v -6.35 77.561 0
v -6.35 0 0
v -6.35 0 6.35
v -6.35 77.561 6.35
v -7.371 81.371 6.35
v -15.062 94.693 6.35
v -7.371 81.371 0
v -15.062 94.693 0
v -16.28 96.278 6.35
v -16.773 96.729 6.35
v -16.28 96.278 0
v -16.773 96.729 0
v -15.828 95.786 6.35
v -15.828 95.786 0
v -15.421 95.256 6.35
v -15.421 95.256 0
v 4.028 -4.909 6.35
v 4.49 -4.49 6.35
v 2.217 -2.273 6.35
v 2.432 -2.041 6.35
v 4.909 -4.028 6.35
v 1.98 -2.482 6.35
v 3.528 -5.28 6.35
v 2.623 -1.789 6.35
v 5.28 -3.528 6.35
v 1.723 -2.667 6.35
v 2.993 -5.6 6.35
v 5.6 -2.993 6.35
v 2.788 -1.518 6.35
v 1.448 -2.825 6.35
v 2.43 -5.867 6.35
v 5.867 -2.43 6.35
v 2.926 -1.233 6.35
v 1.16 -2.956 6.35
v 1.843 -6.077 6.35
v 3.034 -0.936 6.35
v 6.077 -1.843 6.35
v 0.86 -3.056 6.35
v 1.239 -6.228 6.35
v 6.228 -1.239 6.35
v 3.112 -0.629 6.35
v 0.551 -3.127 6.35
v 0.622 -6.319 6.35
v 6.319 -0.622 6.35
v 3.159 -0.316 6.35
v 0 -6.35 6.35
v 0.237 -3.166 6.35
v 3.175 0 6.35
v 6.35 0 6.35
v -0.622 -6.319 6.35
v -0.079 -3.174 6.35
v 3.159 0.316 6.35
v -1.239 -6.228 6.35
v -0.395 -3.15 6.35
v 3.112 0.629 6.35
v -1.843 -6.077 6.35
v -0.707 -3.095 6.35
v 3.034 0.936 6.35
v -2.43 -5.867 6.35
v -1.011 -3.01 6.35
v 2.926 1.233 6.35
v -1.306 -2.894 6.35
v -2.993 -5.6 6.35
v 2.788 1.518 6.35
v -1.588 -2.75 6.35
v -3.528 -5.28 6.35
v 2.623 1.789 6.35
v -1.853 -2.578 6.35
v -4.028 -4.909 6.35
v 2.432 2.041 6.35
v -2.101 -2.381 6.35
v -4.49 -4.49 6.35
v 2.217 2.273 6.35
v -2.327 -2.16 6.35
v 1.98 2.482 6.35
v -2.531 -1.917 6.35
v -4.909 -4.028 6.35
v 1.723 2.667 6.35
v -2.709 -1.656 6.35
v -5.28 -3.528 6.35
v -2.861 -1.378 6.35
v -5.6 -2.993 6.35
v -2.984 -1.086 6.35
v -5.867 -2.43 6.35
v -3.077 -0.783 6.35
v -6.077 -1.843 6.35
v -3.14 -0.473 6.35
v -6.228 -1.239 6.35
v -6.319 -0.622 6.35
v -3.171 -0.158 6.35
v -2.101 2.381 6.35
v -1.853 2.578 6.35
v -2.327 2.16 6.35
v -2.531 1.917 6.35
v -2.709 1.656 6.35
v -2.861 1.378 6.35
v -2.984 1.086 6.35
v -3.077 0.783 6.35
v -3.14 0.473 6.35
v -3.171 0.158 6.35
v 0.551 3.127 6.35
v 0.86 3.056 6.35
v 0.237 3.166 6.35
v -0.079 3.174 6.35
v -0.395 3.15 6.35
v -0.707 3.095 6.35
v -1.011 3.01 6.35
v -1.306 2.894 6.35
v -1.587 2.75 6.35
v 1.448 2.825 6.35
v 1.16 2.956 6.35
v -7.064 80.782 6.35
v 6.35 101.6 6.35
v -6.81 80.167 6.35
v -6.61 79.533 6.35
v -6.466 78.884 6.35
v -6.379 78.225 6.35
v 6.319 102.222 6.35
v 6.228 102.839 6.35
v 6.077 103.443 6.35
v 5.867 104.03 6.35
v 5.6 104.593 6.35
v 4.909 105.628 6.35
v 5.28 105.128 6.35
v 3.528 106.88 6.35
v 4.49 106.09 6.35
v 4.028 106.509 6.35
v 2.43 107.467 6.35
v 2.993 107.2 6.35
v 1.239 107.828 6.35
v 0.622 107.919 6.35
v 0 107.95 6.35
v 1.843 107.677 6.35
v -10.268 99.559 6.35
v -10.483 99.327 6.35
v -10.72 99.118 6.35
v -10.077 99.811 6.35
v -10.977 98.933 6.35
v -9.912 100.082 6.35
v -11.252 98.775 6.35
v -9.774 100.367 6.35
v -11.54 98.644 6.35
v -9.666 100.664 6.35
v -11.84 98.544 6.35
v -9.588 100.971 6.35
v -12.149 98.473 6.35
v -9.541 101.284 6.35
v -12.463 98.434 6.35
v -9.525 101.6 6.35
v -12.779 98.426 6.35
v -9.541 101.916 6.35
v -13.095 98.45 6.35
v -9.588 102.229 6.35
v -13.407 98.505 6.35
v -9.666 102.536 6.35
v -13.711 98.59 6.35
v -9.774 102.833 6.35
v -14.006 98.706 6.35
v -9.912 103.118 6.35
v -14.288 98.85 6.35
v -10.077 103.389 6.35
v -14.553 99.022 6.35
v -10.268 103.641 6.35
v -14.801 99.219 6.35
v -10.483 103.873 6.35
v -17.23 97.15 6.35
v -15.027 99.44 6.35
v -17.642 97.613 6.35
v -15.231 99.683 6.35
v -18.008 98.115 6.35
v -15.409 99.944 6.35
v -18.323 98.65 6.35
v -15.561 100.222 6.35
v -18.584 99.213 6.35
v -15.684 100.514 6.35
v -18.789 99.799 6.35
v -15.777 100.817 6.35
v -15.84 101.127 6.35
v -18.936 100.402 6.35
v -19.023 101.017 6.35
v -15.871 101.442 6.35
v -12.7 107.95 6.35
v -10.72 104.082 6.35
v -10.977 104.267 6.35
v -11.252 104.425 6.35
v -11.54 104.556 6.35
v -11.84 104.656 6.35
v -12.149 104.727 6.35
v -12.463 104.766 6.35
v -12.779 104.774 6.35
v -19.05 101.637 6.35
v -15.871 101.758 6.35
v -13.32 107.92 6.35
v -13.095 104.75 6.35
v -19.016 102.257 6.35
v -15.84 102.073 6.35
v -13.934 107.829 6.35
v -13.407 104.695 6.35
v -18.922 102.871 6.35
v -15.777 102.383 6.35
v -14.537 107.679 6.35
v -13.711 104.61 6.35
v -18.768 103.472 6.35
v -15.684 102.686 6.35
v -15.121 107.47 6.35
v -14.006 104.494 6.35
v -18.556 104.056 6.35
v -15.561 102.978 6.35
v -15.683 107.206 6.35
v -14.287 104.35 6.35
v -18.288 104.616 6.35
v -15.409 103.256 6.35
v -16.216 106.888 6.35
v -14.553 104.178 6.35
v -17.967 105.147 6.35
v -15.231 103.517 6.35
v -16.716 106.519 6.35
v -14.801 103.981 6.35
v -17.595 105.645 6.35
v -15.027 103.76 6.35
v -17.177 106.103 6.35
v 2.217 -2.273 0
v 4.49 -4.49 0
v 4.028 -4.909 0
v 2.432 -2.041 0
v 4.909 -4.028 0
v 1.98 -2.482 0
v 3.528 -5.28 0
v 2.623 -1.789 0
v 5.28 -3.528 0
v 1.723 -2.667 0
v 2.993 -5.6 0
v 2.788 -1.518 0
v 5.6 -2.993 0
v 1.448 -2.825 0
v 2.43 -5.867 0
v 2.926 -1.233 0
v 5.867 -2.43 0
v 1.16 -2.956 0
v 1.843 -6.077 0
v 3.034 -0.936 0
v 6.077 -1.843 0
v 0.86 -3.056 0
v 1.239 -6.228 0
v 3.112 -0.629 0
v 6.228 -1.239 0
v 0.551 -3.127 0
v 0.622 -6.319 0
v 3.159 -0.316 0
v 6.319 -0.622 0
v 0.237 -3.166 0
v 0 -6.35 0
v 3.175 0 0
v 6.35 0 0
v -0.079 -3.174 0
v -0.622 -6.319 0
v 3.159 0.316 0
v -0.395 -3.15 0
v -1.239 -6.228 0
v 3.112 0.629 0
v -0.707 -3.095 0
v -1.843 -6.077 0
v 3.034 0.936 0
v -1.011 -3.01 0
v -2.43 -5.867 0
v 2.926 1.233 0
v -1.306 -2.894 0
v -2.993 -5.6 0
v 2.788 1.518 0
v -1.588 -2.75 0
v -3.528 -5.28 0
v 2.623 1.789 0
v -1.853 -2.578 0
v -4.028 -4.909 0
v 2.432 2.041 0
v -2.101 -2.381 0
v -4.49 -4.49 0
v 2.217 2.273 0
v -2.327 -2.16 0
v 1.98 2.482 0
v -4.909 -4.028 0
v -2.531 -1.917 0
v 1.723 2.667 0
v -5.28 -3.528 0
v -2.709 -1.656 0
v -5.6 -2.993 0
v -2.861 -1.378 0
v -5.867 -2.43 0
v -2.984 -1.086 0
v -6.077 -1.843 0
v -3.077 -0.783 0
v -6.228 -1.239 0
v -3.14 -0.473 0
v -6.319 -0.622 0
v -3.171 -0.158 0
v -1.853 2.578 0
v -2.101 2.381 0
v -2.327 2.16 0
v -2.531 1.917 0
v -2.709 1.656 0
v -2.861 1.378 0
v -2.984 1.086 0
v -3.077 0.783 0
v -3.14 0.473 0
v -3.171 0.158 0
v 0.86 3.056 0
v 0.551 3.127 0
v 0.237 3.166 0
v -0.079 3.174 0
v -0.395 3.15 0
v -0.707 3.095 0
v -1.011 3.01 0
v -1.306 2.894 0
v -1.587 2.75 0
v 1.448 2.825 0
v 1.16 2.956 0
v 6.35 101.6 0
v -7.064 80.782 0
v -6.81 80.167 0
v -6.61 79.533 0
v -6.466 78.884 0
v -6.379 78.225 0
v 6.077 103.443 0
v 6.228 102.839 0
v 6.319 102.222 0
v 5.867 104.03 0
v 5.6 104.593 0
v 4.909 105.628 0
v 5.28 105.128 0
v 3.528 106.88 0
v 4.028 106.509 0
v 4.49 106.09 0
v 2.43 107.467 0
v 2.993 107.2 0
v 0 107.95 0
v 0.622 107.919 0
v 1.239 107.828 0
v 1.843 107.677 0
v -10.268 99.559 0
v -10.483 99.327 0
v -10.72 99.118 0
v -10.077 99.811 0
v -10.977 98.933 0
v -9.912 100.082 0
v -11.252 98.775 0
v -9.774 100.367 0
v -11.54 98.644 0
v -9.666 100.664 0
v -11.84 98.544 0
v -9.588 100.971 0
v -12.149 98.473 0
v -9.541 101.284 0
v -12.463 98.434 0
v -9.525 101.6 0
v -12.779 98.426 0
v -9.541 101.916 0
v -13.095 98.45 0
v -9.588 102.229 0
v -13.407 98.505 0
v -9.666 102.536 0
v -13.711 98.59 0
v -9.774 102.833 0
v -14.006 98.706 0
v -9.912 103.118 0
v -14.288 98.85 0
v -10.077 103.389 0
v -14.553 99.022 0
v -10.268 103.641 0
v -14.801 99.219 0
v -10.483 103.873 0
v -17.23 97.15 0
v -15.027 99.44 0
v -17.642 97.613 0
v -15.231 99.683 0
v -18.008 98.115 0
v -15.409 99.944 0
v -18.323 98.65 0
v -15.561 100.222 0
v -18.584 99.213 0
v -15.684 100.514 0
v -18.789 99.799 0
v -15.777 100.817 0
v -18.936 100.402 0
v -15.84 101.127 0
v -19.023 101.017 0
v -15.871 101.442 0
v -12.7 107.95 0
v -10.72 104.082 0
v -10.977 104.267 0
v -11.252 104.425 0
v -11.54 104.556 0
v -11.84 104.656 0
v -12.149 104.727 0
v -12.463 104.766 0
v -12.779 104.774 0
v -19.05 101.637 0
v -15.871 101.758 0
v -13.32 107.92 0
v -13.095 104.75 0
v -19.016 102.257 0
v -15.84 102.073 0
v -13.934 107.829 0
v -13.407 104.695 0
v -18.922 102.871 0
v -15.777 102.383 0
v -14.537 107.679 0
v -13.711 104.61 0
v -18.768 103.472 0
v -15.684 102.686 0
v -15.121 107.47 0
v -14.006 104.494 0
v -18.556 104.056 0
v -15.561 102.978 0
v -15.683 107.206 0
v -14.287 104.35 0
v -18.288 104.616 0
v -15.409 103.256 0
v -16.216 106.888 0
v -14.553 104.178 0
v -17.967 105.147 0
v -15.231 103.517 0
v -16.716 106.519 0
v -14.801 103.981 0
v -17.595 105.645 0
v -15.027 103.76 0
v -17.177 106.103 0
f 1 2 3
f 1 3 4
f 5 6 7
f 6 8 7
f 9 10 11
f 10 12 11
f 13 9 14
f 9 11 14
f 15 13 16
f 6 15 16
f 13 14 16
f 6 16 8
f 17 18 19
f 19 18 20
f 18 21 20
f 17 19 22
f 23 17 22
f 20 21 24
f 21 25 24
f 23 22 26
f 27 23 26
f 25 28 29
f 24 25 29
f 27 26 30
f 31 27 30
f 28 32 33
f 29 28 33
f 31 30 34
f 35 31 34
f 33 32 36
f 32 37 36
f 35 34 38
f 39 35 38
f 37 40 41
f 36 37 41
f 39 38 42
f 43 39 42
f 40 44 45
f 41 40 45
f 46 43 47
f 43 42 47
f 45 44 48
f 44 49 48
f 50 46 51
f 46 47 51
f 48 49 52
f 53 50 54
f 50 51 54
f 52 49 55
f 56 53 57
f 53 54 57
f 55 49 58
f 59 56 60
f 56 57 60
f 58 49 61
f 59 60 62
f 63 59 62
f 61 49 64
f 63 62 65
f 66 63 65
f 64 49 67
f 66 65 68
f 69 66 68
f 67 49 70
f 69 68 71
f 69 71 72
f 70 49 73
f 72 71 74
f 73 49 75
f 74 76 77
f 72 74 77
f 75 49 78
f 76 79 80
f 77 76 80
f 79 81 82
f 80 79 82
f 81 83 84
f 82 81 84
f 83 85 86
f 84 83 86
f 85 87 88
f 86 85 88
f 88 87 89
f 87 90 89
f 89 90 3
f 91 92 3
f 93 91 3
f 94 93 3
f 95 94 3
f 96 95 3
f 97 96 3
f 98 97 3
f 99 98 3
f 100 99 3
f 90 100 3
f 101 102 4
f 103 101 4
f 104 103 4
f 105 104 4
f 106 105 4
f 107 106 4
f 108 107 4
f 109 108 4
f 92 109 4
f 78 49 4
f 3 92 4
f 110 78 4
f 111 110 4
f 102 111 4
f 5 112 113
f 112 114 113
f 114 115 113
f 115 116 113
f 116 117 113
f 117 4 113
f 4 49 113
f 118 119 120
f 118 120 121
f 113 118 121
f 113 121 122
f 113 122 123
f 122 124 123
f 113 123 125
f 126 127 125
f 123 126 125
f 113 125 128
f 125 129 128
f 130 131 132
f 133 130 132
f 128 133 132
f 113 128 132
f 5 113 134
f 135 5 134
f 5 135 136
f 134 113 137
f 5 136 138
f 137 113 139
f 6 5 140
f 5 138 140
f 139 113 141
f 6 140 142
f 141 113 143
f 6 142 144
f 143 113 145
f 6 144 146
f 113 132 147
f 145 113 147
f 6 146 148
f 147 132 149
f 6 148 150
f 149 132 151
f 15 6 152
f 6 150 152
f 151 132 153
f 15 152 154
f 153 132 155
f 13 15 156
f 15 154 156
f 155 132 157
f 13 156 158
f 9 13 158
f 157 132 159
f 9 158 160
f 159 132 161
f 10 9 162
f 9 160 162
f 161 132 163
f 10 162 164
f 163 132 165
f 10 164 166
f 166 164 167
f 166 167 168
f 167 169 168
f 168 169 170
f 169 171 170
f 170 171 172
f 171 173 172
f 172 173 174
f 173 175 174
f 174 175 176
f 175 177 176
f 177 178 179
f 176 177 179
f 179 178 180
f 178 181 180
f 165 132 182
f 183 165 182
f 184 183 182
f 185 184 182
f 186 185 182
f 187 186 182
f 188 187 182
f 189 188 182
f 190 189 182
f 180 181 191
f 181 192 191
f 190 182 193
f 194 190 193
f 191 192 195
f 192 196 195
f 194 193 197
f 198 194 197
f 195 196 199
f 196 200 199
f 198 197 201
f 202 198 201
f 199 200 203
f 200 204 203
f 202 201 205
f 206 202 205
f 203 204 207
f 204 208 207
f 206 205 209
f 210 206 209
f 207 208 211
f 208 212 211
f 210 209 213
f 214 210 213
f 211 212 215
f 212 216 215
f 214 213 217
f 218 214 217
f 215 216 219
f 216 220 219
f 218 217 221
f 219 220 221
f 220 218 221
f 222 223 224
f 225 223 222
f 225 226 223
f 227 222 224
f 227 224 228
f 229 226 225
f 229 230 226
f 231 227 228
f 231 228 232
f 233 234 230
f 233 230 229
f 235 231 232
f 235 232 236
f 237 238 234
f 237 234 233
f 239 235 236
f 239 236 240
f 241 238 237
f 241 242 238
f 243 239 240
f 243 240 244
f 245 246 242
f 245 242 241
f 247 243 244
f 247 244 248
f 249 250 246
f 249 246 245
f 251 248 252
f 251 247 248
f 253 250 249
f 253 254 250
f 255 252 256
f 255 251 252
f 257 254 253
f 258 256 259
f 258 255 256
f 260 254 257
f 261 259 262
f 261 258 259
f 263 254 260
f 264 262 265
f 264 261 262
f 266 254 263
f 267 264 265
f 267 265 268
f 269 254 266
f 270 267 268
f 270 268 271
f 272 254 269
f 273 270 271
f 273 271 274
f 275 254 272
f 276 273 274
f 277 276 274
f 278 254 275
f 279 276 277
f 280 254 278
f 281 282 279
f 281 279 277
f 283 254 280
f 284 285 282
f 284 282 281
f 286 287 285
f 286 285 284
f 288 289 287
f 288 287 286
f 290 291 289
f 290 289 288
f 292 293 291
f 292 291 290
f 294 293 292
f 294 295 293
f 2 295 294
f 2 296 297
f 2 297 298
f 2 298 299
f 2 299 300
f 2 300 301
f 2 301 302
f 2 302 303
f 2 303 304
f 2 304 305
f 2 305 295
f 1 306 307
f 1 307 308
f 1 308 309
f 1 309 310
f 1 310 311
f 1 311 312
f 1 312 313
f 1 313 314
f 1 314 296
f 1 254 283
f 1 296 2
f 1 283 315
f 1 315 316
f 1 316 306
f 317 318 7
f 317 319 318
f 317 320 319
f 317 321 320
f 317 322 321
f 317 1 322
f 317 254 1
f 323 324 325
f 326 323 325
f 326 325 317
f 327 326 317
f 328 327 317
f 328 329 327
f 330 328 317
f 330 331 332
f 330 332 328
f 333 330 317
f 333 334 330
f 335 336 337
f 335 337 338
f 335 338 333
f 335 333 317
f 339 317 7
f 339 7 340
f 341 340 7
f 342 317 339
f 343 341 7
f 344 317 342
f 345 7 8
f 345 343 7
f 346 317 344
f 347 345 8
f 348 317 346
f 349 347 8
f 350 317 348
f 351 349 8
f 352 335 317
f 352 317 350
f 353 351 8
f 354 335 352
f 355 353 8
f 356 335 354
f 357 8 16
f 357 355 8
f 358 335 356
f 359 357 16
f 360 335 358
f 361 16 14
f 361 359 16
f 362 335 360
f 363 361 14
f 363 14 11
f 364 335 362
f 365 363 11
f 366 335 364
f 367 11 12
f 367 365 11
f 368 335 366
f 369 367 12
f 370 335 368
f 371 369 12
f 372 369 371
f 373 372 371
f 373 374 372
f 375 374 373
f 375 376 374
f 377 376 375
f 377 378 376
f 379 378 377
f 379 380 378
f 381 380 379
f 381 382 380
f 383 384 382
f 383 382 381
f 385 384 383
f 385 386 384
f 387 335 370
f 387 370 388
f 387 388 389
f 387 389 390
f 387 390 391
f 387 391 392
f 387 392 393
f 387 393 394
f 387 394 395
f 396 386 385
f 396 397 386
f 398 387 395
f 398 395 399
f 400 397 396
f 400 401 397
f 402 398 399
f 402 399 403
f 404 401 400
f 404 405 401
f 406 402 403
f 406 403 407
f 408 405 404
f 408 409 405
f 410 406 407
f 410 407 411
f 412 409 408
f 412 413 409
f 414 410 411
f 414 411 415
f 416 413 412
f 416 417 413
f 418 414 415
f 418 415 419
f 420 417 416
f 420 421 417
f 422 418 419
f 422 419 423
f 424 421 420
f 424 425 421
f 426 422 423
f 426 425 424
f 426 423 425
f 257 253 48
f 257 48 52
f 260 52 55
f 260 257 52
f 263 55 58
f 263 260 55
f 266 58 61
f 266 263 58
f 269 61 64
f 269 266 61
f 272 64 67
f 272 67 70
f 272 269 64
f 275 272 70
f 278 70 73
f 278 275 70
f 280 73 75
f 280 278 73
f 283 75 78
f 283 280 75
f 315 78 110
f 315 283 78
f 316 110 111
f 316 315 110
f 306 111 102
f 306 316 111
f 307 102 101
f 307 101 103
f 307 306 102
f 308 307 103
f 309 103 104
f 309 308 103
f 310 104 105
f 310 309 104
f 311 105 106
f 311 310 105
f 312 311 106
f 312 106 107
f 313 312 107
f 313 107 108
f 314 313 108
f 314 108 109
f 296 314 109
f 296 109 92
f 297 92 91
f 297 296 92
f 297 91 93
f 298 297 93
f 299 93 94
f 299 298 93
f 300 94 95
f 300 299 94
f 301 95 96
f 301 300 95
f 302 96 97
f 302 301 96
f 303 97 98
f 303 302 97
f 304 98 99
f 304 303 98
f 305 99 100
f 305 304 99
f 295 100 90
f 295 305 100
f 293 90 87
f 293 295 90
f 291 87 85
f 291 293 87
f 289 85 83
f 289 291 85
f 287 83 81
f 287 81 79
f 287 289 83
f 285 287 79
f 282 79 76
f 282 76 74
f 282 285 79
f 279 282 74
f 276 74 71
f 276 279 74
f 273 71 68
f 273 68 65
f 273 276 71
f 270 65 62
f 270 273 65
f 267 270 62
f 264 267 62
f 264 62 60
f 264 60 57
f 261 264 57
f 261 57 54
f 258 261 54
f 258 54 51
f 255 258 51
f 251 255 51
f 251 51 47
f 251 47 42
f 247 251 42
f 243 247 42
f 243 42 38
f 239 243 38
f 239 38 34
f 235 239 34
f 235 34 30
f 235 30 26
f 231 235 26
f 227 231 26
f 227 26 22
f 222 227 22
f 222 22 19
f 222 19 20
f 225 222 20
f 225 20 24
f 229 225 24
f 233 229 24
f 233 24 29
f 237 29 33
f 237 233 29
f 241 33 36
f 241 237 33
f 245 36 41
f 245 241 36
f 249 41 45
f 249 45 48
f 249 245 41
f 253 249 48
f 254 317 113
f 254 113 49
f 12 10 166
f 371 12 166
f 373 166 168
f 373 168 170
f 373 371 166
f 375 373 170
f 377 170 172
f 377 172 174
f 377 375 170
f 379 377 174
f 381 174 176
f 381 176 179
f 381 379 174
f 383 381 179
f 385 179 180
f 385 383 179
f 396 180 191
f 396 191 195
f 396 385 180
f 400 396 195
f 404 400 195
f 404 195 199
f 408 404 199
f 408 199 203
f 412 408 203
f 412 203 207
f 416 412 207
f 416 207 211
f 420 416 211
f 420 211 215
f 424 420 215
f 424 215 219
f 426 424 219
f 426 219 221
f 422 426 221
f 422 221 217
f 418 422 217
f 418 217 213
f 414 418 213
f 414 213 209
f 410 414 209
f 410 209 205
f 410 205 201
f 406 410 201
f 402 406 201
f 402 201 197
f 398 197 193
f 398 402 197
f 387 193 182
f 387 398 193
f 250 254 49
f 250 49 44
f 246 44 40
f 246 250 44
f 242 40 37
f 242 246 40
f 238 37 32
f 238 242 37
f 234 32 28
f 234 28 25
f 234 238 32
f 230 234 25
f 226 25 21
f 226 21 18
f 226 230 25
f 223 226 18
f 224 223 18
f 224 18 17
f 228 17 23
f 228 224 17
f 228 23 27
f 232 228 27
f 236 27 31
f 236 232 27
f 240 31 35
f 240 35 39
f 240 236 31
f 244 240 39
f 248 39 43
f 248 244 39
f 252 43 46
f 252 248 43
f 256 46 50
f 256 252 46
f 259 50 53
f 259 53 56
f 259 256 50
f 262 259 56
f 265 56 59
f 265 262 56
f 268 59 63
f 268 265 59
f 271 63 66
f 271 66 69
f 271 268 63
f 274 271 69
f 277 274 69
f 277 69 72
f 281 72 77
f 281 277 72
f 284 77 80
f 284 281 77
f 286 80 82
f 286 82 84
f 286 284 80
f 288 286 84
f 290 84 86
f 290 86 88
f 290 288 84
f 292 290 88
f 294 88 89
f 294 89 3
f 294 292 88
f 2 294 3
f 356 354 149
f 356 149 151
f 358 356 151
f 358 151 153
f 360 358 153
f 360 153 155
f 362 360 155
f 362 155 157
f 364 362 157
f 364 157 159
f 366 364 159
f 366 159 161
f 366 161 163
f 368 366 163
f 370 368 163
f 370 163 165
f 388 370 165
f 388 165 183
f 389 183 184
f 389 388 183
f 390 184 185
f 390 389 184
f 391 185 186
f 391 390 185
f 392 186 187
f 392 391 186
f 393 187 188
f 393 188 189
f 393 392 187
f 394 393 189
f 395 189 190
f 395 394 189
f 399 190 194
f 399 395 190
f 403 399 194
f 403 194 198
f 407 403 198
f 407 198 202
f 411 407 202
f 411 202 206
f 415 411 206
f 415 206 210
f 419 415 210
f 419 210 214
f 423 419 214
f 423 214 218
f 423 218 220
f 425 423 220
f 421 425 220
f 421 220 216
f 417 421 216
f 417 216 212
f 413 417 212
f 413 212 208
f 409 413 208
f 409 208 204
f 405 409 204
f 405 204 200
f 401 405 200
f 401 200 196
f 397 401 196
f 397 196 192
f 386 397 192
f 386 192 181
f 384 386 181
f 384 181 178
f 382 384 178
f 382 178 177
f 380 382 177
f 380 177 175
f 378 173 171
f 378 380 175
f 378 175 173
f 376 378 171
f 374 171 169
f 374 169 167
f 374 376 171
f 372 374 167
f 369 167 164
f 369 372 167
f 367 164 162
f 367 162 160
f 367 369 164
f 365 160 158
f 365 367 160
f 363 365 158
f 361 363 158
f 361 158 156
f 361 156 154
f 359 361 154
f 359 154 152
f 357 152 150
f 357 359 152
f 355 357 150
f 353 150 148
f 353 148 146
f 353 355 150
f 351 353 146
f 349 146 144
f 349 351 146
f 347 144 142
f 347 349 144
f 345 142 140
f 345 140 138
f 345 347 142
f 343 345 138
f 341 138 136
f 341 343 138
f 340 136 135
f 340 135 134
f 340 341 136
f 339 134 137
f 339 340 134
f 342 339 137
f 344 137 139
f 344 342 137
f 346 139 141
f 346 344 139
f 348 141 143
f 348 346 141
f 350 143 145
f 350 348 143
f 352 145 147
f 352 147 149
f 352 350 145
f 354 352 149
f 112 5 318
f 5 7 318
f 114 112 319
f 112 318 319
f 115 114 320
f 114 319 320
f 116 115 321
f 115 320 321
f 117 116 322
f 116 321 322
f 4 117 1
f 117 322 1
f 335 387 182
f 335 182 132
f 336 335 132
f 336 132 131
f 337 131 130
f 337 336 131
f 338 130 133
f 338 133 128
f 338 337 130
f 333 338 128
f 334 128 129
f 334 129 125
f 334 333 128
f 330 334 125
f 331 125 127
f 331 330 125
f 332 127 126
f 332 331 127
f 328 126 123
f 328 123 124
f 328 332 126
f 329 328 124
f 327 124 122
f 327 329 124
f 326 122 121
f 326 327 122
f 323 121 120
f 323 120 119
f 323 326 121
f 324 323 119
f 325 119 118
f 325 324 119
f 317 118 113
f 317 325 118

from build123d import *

# Parameters (mm, degrees)
SKETCH1_R           = 3.175
BOSS_EXTRUDE1_DEPTH = 6.35
CHAMFER1_START      = 34.302216058
CHAMFER1_OUTLINE_W  = 19.05
CHAMFER1_OUTLINE_H  = 6.35
CHAMFER1_DEPTH      = 8.674261314
FILLET1_R           = 7.62


with BuildPart() as part:
    # Sketch1 → Boss-Extrude1 (new body)
    with BuildSketch(Plane.XY):
        with BuildLine():
            Line((-6.35, 0), (-6.35, 95.25))
            Line((-6.35, 95.25), (-12.7, 95.25))
            ThreePointArc((-12.7, 95.25), (-19.05, 101.6), (-12.7, 107.95))
            Line((-12.7, 107.95), (0, 107.95))
            ThreePointArc((0, 107.95), (4.490128061, 106.090128061), (6.35, 101.6))
            Line((6.35, 101.6), (6.35, 0))
            ThreePointArc((6.35, 0), (0, -6.35), (-6.35, 0))
        make_face()
        Circle(SKETCH1_R, mode=Mode.SUBTRACT)
        with Locations((-12.7, 101.6)):
            Circle(SKETCH1_R, mode=Mode.SUBTRACT)
    extrude(amount=BOSS_EXTRUDE1_DEPTH)

    # Chamfer1: read off the stored shape, not the designer's step
    # Chamfer1 outline → Chamfer1 (add)
    with BuildSketch(Plane(origin=(0, 0, 0), x_dir=(0.49999999999999195, -0.8660254037844434, 0), z_dir=(0.8660254037844433, 0.4999999999999921, 0)).offset(CHAMFER1_START)):
        with Locations((-81.638181024, -3.175)):
            Rectangle(CHAMFER1_OUTLINE_W, CHAMFER1_OUTLINE_H)
    extrude(amount=CHAMFER1_DEPTH)

    # Fillet1
    fillet1_edges = [part.edges().sort_by_distance(p)[0] for p in [
        (-6.35, 79.602954743, 3.175),
        (-15.875, 96.100738686, 3.175),
    ]]
    fillet(fillet1_edges, radius=FILLET1_R)


solid = part.part
